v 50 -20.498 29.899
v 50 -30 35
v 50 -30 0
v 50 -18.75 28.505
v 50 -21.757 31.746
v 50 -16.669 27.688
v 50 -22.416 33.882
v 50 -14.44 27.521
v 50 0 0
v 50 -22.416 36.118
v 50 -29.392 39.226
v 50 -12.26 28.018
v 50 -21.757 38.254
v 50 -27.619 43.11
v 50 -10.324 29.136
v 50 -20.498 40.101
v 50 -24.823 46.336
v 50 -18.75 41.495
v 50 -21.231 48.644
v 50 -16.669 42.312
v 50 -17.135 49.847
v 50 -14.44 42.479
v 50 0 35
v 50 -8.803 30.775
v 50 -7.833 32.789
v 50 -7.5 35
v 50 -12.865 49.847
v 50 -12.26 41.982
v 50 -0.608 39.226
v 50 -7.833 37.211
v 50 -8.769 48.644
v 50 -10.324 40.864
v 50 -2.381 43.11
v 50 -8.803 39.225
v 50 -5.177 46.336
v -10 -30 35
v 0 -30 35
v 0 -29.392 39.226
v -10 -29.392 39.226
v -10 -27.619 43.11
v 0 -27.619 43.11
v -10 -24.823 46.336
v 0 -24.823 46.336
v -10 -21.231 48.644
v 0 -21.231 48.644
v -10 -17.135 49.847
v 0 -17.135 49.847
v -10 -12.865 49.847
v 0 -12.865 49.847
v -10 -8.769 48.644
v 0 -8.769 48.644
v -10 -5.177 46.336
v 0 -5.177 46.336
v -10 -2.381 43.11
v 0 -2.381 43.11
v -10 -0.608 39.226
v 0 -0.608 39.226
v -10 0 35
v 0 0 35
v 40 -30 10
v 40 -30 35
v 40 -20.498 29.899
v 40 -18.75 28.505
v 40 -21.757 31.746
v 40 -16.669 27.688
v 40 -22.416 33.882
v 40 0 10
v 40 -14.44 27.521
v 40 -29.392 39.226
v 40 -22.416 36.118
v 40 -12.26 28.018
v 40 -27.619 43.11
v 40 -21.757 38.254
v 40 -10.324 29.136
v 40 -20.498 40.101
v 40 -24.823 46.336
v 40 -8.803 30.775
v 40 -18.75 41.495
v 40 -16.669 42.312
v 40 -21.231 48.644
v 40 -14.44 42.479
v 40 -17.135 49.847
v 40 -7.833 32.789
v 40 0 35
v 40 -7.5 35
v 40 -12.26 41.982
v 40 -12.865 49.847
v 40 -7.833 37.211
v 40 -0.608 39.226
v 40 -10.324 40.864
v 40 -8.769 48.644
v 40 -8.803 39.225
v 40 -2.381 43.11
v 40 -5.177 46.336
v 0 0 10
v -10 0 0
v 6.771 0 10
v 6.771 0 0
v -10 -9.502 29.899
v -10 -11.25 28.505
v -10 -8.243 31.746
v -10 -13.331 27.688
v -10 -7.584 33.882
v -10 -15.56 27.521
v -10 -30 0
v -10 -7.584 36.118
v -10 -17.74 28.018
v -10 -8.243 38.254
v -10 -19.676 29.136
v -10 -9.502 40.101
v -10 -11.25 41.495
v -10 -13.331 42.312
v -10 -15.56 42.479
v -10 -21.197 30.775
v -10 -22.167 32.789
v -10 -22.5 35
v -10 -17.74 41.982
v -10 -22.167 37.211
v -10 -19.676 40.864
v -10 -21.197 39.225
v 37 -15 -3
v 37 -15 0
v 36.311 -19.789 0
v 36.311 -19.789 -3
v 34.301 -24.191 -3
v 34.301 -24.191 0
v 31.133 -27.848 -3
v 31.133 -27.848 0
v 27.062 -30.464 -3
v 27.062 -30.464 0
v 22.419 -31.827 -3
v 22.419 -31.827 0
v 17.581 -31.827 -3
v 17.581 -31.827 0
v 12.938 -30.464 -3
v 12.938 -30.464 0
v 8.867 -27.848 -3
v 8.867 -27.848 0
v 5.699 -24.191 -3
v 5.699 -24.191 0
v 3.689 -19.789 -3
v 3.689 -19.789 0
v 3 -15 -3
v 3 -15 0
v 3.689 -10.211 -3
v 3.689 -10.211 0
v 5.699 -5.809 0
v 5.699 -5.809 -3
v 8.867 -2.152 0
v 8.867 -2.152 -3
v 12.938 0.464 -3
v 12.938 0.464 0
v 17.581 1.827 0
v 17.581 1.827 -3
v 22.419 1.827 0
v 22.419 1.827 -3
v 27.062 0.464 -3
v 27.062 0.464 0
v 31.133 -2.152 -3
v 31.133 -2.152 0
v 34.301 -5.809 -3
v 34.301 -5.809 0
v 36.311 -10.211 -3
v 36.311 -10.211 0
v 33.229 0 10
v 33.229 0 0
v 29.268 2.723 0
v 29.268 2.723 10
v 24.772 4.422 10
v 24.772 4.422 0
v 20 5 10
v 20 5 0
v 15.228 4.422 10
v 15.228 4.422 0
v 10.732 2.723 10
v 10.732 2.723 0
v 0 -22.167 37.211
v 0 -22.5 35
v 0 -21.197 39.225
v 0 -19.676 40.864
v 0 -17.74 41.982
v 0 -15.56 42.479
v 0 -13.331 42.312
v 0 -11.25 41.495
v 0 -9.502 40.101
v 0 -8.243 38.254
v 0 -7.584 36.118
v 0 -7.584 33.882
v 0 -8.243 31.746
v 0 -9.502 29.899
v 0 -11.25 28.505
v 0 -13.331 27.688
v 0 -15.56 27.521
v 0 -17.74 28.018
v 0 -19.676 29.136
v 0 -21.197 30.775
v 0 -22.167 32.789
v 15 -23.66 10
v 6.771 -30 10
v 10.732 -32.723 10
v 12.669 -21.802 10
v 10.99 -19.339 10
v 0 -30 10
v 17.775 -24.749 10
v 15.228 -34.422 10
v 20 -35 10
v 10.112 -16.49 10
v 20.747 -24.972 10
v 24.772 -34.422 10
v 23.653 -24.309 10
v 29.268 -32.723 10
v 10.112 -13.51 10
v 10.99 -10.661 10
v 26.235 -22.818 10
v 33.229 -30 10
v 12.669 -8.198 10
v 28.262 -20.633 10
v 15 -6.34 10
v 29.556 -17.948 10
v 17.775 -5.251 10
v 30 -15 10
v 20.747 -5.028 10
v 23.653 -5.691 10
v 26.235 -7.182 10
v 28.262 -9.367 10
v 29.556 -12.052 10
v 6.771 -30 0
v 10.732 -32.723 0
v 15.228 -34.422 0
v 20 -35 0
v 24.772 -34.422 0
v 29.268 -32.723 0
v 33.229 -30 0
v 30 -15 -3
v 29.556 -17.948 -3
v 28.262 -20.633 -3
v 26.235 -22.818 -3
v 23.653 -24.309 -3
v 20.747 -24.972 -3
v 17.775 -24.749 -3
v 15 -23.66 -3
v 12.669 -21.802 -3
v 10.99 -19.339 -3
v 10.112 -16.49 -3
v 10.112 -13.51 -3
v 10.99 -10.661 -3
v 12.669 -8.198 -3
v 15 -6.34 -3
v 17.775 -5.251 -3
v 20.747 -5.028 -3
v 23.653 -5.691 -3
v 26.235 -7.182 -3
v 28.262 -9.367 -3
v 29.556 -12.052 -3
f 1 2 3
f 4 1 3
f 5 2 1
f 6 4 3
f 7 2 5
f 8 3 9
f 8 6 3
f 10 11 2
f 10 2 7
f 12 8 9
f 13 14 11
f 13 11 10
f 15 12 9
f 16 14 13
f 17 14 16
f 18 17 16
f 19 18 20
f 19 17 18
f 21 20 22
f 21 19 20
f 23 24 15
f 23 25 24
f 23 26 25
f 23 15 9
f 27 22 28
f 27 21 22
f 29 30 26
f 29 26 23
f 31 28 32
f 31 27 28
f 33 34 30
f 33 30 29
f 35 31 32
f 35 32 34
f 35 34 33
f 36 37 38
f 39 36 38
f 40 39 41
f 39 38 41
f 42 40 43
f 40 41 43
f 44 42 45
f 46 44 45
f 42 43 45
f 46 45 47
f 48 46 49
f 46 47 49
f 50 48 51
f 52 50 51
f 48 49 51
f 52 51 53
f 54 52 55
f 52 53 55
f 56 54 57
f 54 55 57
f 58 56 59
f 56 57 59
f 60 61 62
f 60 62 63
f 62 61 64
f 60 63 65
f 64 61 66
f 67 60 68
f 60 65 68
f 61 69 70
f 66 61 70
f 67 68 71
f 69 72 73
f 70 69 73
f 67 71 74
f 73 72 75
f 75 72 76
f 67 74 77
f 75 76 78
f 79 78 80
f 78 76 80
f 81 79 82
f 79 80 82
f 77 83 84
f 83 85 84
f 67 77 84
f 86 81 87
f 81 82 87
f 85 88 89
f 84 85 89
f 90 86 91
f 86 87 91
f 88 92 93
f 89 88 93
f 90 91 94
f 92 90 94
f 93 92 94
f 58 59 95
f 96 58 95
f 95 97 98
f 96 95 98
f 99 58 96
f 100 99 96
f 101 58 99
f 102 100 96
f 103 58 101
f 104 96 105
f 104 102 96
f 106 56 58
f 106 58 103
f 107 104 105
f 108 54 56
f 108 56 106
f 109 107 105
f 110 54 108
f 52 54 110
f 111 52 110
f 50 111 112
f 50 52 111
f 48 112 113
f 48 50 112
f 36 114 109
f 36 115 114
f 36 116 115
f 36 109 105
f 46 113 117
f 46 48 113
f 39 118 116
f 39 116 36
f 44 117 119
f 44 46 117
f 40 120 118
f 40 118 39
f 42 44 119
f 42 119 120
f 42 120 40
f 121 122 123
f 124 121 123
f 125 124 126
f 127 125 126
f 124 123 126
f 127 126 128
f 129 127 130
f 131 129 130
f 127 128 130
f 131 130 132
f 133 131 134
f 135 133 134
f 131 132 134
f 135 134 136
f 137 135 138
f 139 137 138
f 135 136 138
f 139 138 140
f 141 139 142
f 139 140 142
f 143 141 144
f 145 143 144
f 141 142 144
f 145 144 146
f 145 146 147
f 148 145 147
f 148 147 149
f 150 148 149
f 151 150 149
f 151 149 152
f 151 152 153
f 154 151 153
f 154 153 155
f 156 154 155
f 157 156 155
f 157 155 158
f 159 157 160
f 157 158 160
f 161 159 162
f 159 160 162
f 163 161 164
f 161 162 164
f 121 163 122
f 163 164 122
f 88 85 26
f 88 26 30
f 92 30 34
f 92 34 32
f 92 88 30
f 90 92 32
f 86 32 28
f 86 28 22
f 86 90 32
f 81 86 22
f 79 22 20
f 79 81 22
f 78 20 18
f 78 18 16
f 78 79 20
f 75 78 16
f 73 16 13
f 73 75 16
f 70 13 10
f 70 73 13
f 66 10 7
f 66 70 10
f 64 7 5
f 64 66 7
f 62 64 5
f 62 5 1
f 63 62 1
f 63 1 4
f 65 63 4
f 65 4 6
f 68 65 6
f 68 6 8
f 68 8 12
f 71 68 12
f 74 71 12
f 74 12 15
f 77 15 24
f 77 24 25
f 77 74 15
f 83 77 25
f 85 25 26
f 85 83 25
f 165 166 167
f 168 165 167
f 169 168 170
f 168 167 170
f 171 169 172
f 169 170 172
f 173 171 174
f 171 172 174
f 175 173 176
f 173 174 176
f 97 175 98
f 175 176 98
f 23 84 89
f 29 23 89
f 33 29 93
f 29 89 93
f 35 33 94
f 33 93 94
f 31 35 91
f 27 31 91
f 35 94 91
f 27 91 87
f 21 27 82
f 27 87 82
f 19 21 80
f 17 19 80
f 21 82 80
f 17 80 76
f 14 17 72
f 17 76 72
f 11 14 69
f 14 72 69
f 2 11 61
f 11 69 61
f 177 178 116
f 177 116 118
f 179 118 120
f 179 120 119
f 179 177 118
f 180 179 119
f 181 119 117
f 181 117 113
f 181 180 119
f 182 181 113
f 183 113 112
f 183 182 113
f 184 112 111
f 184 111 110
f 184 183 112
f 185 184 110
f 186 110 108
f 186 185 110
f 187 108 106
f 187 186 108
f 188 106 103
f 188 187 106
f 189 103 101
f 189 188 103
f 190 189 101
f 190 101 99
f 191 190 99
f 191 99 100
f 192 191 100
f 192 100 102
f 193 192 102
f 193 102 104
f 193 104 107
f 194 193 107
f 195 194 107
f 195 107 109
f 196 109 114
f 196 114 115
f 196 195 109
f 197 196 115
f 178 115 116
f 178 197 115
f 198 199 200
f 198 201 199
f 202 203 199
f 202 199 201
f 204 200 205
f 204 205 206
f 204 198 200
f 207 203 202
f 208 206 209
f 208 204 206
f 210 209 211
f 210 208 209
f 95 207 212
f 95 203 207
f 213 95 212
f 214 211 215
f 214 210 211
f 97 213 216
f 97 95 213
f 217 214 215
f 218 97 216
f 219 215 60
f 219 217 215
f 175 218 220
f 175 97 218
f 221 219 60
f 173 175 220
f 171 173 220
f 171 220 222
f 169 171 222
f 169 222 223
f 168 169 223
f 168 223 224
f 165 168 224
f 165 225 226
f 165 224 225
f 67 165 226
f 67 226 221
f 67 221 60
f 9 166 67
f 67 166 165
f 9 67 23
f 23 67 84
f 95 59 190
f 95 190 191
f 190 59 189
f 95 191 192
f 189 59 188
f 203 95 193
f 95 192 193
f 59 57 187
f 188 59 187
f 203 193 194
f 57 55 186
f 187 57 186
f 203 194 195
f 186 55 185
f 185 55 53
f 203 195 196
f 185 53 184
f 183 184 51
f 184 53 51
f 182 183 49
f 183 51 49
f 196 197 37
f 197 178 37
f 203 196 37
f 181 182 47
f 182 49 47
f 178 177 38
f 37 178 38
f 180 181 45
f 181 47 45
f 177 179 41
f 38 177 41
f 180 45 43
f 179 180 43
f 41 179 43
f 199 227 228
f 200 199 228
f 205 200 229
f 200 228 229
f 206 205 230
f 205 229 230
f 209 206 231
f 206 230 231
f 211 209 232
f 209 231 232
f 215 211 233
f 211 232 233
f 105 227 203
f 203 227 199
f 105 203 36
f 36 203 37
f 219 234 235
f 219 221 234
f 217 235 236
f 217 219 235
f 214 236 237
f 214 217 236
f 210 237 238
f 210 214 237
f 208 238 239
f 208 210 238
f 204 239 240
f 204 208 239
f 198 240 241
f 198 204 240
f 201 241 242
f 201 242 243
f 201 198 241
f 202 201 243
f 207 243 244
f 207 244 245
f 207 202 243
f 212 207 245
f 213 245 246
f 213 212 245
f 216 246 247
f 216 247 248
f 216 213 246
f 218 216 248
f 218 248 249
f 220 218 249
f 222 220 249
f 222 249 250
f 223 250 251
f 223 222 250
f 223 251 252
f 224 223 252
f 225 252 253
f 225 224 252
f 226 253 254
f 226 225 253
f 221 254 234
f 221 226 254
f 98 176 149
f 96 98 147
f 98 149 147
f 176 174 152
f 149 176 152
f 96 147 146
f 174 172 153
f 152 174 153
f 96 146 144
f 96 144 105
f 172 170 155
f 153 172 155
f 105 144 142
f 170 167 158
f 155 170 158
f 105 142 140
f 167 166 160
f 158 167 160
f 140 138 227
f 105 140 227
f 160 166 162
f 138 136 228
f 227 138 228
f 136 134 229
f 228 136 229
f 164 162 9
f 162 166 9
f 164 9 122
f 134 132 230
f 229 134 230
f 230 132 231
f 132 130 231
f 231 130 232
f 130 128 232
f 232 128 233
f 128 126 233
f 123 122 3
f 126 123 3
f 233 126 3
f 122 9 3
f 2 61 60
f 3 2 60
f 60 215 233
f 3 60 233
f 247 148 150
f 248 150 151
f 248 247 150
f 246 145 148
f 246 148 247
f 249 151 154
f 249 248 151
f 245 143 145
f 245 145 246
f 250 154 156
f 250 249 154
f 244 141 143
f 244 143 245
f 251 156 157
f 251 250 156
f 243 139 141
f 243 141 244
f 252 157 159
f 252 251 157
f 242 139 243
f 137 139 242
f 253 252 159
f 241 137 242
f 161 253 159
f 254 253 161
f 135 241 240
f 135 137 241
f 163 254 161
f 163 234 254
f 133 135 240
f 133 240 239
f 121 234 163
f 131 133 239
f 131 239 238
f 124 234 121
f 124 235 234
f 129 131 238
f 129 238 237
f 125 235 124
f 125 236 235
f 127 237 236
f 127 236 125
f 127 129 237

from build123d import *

# Parameters (mm, degrees)
F0_R     = 10
F1_DEPTH = 10
F2_R     = 17
F2_R_2   = 10
F3_DEPTH = 3
F4_R     = 7.5
F5_DEPTH = 10
F6_R     = 7.5
F7_DEPTH = 10


with BuildPart() as f1:
    # F0 (on Top) → F1 (new body)
    with BuildSketch(Plane.XY):
        with BuildLine():
            Line((6.7712434447, 0), (0, 0))
            Line((0, 0), (0, -15))
            ThreePointArc((0, -15), (1.7712434447, -6.7712434447), (6.7712434447, 0))
        make_face()
        with BuildLine():
            ThreePointArc((6.7712434447, -30), (1.7712434447, -23.2287565553), (0, -15))
            Line((0, -15), (0, -30))
            Line((0, -30), (6.7712434447, -30))
        make_face()
        with BuildLine():
            Line((40, 0), (33.2287565553, 0))
            ThreePointArc((33.2287565553, 0), (38.2287565553, -6.7712434447), (40, -15))
            Line((40, -15), (40, 0))
        make_face()
        with BuildLine():
            Line((40, -30), (40, -15))
            ThreePointArc((40, -15), (38.2287565553, -23.2287565553), (33.2287565553, -30))
            Line((33.2287565553, -30), (40, -30))
        make_face()
        with BuildLine():
            Line((33.2287565553, 0), (6.7712434447, 0))
            ThreePointArc((6.7712434447, 0), (1.7712434447, -6.7712434447), (0, -15))
            ThreePointArc((0, -15), (1.7712434447, -23.2287565553), (6.7712434447, -30))
            Line((6.7712434447, -30), (33.2287565553, -30))
            ThreePointArc((33.2287565553, -30), (38.2287565553, -23.2287565553), (40, -15))
            ThreePointArc((40, -15), (38.2287565553, -6.7712434447), (33.2287565553, 0))
        make_face()
        with Locations((20, -15)):
            Circle(F0_R, mode=Mode.SUBTRACT)
        with BuildLine():
            ThreePointArc((33.2287565553, 0), (20, 5), (6.7712434447, 0))
            Line((6.7712434447, 0), (33.2287565553, 0))
        make_face()
        with BuildLine():
            Line((33.2287565553, -30), (6.7712434447, -30))
            ThreePointArc((6.7712434447, -30), (20, -35), (33.2287565553, -30))
        make_face()
    extrude(amount=F1_DEPTH)

    # F2 (on face) → F3 (join)
    with BuildSketch(Plane(origin=(0, 0, 0), x_dir=(1, 0, 0), z_dir=(0, 0, -1))):
        with Locations((20, 15)):
            Circle(F2_R)
        with Locations((20, 15)):
            Circle(F2_R_2, mode=Mode.SUBTRACT)
    extrude(amount=F3_DEPTH)

    # F4 (on face) → F5 (join)
    with BuildSketch(Plane.YZ.offset(40)):
        with BuildLine():
            Line((-30, 35), (-30, 0))
            Line((-30, 0), (0, 0))
            Line((0, 0), (0, 35))
            ThreePointArc((0, 35), (-15, 50), (-30, 35))
        make_face()
        with Locations((-15, 35)):
            Circle(F4_R, mode=Mode.SUBTRACT)
    extrude(amount=F5_DEPTH)

    # F6 (on face) → F7 (join)
    with BuildSketch(Plane(origin=(0, 0, 0), x_dir=(0, -1, 0), z_dir=(-1, 0, 0))):
        with BuildLine():
            ThreePointArc((30, 35), (15, 50), (0, 35))
            Line((0, 35), (0, 0))
            Line((0, 0), (30, 0))
            Line((30, 0), (30, 35))
        make_face()
        with Locations((15, 35)):
            Circle(F6_R, mode=Mode.SUBTRACT)
    extrude(amount=F7_DEPTH)


solid = f1.part
